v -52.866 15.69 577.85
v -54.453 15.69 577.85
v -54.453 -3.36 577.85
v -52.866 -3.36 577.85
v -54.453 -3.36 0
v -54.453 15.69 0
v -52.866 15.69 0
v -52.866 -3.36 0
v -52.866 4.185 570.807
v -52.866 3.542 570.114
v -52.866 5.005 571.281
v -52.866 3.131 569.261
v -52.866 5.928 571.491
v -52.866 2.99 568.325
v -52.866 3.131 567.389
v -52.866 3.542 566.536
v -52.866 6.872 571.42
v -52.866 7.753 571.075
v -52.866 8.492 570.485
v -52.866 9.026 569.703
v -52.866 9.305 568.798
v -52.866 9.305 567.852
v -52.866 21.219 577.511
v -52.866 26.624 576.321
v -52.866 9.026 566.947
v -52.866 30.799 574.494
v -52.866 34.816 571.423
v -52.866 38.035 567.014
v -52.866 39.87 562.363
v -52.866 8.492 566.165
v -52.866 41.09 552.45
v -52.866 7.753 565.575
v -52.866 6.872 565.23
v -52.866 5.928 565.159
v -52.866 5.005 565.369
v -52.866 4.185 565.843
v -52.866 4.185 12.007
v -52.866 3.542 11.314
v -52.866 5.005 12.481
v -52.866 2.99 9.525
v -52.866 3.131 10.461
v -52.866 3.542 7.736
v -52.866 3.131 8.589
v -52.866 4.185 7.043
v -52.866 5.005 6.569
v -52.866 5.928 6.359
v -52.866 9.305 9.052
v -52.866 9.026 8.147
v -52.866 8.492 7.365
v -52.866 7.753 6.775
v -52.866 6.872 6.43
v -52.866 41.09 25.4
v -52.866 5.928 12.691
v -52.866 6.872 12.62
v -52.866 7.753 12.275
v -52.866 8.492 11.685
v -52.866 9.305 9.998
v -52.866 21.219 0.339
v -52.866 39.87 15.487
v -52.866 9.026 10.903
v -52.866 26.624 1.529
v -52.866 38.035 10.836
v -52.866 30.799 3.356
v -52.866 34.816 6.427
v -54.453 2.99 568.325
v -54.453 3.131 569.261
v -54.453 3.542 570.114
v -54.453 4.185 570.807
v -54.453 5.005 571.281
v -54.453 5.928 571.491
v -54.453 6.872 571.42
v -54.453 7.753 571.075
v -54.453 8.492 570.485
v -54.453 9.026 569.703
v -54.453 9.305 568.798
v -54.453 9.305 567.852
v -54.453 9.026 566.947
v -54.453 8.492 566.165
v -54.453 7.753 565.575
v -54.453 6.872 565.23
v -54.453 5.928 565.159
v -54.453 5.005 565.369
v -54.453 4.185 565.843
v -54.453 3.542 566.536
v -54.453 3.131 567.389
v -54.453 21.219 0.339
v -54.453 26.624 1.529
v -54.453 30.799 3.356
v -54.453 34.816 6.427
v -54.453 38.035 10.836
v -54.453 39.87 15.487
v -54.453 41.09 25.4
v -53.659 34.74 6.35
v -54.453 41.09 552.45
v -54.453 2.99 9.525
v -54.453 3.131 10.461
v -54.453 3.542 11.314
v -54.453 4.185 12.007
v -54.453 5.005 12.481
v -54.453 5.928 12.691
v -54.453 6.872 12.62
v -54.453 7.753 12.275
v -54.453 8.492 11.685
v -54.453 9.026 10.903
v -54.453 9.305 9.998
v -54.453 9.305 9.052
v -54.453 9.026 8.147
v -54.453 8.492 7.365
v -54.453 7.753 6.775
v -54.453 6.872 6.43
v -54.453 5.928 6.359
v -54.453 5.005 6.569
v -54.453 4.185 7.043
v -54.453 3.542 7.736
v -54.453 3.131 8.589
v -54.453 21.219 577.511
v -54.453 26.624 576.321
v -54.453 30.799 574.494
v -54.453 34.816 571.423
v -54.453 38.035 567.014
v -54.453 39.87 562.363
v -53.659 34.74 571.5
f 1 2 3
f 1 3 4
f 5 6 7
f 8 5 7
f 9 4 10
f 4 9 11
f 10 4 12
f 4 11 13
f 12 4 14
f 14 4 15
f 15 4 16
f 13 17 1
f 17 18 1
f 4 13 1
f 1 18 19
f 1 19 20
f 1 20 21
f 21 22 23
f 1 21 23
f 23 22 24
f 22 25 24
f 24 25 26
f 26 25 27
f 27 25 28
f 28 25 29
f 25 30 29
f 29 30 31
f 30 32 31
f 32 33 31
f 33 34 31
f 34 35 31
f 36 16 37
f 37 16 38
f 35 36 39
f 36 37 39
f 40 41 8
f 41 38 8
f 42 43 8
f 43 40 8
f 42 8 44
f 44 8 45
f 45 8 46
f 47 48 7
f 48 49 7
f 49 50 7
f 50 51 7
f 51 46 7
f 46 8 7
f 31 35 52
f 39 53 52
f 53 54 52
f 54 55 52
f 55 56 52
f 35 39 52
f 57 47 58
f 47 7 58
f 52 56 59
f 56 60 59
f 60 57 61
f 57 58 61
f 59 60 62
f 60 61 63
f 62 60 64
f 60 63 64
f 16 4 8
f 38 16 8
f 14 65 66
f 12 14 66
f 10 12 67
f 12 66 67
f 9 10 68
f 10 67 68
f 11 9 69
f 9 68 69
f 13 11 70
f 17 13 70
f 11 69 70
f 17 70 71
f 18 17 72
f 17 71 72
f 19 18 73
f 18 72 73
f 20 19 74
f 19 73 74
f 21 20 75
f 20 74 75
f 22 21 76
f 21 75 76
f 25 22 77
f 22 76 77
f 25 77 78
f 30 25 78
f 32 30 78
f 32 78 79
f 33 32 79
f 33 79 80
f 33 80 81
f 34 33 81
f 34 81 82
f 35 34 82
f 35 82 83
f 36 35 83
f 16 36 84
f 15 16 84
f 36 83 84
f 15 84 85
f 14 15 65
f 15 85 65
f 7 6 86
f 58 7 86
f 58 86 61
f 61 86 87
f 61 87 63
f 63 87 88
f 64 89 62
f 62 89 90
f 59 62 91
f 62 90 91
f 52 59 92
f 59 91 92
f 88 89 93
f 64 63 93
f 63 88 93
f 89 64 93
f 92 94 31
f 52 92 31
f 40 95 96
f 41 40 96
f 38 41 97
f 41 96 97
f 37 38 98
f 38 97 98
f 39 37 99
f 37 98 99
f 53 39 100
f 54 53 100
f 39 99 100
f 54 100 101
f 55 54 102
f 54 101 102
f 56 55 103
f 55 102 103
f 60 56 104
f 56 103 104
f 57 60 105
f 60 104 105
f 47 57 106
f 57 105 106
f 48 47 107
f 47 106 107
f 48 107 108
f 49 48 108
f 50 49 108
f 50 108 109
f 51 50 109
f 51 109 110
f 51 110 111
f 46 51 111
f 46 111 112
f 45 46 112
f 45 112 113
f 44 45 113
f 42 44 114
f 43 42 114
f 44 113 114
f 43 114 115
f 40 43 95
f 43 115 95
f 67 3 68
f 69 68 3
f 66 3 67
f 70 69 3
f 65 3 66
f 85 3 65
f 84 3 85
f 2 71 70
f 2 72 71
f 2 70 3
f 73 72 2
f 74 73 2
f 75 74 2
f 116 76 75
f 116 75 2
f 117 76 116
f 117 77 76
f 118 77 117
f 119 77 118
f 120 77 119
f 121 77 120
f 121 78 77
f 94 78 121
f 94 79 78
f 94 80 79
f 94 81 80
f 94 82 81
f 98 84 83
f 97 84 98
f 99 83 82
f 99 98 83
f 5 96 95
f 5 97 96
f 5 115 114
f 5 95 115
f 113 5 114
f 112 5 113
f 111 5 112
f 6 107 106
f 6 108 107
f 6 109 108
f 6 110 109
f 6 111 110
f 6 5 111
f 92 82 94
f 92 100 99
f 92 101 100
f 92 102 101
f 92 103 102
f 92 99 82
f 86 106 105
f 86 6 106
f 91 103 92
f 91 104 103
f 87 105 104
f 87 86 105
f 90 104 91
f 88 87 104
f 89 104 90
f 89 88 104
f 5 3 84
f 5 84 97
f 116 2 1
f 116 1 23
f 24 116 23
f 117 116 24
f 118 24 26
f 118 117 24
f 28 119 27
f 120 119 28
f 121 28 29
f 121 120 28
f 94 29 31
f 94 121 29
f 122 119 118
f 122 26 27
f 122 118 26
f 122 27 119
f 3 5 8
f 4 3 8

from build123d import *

# Parameters (mm, degrees)
F0_W        = 1.5875
F0_H        = 44.45
F1_DEPTH    = 577.85
F2_R        = 3.175
F3_DEPTH    = 1.5875
F4_T1_DEPTH = 128.5875


# Not quite as in the source:
# - a fillet or chamfer that OpenCascade refuses, or shapes differently, is made with other operations: its cross-section is extruded or revolved along the edge and cut away or added


with BuildPart() as f1:
    # F0 (on Top) → F1 (new body)
    with BuildSketch(Plane.XY):
        with Locations((-53.6594138073, 18.865058393)):
            Rectangle(F0_W, F0_H)
    extrude(amount=F1_DEPTH)

    # F2 (on face) → F3 (cut)
    with BuildSketch(Plane(origin=(-54.4531638073, 0, 0), x_dir=(0, -1, 0), z_dir=(-1, 0, 0))):
        with Locations((-6.165058393, 9.525)):
            Circle(F2_R)
        with Locations((-6.165058393, 568.325)):
            Circle(F2_R)
    extrude(amount=-F3_DEPTH, mode=Mode.SUBTRACT)

    # F4: fillet of radius 25.4 on 2 edges, made by hand

    # F4_s2 → F4_t1 (cut)
    with BuildSketch(Plane.YZ.offset(-117.9531638073)):
        with BuildLine():
            add(Edge.make_bspline(
                [(15.690058393, 577.85), (41.090058393, 577.85), (41.090058393, 552.45)],
                knots=[0, 0, 0, 1, 1, 1], degree=2, weights=[1, 1, 1]))
            Line((41.090058393, 552.45), (41.090058393, 577.85))
            Line((41.090058393, 577.85), (15.690058393, 577.85))
        make_face()
        with BuildLine():
            add(Edge.make_bspline(
                [(15.690058393, 0), (41.090058393, 0), (41.090058393, 25.4)],
                knots=[0, 0, 0, 1, 1, 1], degree=2, weights=[1, 1, 1]))
            Line((41.090058393, 25.4), (41.090058393, 0))
            Line((41.090058393, 0), (15.690058393, 0))
        make_face()
    extrude(amount=F4_T1_DEPTH, mode=Mode.SUBTRACT)


solid = f1.part
